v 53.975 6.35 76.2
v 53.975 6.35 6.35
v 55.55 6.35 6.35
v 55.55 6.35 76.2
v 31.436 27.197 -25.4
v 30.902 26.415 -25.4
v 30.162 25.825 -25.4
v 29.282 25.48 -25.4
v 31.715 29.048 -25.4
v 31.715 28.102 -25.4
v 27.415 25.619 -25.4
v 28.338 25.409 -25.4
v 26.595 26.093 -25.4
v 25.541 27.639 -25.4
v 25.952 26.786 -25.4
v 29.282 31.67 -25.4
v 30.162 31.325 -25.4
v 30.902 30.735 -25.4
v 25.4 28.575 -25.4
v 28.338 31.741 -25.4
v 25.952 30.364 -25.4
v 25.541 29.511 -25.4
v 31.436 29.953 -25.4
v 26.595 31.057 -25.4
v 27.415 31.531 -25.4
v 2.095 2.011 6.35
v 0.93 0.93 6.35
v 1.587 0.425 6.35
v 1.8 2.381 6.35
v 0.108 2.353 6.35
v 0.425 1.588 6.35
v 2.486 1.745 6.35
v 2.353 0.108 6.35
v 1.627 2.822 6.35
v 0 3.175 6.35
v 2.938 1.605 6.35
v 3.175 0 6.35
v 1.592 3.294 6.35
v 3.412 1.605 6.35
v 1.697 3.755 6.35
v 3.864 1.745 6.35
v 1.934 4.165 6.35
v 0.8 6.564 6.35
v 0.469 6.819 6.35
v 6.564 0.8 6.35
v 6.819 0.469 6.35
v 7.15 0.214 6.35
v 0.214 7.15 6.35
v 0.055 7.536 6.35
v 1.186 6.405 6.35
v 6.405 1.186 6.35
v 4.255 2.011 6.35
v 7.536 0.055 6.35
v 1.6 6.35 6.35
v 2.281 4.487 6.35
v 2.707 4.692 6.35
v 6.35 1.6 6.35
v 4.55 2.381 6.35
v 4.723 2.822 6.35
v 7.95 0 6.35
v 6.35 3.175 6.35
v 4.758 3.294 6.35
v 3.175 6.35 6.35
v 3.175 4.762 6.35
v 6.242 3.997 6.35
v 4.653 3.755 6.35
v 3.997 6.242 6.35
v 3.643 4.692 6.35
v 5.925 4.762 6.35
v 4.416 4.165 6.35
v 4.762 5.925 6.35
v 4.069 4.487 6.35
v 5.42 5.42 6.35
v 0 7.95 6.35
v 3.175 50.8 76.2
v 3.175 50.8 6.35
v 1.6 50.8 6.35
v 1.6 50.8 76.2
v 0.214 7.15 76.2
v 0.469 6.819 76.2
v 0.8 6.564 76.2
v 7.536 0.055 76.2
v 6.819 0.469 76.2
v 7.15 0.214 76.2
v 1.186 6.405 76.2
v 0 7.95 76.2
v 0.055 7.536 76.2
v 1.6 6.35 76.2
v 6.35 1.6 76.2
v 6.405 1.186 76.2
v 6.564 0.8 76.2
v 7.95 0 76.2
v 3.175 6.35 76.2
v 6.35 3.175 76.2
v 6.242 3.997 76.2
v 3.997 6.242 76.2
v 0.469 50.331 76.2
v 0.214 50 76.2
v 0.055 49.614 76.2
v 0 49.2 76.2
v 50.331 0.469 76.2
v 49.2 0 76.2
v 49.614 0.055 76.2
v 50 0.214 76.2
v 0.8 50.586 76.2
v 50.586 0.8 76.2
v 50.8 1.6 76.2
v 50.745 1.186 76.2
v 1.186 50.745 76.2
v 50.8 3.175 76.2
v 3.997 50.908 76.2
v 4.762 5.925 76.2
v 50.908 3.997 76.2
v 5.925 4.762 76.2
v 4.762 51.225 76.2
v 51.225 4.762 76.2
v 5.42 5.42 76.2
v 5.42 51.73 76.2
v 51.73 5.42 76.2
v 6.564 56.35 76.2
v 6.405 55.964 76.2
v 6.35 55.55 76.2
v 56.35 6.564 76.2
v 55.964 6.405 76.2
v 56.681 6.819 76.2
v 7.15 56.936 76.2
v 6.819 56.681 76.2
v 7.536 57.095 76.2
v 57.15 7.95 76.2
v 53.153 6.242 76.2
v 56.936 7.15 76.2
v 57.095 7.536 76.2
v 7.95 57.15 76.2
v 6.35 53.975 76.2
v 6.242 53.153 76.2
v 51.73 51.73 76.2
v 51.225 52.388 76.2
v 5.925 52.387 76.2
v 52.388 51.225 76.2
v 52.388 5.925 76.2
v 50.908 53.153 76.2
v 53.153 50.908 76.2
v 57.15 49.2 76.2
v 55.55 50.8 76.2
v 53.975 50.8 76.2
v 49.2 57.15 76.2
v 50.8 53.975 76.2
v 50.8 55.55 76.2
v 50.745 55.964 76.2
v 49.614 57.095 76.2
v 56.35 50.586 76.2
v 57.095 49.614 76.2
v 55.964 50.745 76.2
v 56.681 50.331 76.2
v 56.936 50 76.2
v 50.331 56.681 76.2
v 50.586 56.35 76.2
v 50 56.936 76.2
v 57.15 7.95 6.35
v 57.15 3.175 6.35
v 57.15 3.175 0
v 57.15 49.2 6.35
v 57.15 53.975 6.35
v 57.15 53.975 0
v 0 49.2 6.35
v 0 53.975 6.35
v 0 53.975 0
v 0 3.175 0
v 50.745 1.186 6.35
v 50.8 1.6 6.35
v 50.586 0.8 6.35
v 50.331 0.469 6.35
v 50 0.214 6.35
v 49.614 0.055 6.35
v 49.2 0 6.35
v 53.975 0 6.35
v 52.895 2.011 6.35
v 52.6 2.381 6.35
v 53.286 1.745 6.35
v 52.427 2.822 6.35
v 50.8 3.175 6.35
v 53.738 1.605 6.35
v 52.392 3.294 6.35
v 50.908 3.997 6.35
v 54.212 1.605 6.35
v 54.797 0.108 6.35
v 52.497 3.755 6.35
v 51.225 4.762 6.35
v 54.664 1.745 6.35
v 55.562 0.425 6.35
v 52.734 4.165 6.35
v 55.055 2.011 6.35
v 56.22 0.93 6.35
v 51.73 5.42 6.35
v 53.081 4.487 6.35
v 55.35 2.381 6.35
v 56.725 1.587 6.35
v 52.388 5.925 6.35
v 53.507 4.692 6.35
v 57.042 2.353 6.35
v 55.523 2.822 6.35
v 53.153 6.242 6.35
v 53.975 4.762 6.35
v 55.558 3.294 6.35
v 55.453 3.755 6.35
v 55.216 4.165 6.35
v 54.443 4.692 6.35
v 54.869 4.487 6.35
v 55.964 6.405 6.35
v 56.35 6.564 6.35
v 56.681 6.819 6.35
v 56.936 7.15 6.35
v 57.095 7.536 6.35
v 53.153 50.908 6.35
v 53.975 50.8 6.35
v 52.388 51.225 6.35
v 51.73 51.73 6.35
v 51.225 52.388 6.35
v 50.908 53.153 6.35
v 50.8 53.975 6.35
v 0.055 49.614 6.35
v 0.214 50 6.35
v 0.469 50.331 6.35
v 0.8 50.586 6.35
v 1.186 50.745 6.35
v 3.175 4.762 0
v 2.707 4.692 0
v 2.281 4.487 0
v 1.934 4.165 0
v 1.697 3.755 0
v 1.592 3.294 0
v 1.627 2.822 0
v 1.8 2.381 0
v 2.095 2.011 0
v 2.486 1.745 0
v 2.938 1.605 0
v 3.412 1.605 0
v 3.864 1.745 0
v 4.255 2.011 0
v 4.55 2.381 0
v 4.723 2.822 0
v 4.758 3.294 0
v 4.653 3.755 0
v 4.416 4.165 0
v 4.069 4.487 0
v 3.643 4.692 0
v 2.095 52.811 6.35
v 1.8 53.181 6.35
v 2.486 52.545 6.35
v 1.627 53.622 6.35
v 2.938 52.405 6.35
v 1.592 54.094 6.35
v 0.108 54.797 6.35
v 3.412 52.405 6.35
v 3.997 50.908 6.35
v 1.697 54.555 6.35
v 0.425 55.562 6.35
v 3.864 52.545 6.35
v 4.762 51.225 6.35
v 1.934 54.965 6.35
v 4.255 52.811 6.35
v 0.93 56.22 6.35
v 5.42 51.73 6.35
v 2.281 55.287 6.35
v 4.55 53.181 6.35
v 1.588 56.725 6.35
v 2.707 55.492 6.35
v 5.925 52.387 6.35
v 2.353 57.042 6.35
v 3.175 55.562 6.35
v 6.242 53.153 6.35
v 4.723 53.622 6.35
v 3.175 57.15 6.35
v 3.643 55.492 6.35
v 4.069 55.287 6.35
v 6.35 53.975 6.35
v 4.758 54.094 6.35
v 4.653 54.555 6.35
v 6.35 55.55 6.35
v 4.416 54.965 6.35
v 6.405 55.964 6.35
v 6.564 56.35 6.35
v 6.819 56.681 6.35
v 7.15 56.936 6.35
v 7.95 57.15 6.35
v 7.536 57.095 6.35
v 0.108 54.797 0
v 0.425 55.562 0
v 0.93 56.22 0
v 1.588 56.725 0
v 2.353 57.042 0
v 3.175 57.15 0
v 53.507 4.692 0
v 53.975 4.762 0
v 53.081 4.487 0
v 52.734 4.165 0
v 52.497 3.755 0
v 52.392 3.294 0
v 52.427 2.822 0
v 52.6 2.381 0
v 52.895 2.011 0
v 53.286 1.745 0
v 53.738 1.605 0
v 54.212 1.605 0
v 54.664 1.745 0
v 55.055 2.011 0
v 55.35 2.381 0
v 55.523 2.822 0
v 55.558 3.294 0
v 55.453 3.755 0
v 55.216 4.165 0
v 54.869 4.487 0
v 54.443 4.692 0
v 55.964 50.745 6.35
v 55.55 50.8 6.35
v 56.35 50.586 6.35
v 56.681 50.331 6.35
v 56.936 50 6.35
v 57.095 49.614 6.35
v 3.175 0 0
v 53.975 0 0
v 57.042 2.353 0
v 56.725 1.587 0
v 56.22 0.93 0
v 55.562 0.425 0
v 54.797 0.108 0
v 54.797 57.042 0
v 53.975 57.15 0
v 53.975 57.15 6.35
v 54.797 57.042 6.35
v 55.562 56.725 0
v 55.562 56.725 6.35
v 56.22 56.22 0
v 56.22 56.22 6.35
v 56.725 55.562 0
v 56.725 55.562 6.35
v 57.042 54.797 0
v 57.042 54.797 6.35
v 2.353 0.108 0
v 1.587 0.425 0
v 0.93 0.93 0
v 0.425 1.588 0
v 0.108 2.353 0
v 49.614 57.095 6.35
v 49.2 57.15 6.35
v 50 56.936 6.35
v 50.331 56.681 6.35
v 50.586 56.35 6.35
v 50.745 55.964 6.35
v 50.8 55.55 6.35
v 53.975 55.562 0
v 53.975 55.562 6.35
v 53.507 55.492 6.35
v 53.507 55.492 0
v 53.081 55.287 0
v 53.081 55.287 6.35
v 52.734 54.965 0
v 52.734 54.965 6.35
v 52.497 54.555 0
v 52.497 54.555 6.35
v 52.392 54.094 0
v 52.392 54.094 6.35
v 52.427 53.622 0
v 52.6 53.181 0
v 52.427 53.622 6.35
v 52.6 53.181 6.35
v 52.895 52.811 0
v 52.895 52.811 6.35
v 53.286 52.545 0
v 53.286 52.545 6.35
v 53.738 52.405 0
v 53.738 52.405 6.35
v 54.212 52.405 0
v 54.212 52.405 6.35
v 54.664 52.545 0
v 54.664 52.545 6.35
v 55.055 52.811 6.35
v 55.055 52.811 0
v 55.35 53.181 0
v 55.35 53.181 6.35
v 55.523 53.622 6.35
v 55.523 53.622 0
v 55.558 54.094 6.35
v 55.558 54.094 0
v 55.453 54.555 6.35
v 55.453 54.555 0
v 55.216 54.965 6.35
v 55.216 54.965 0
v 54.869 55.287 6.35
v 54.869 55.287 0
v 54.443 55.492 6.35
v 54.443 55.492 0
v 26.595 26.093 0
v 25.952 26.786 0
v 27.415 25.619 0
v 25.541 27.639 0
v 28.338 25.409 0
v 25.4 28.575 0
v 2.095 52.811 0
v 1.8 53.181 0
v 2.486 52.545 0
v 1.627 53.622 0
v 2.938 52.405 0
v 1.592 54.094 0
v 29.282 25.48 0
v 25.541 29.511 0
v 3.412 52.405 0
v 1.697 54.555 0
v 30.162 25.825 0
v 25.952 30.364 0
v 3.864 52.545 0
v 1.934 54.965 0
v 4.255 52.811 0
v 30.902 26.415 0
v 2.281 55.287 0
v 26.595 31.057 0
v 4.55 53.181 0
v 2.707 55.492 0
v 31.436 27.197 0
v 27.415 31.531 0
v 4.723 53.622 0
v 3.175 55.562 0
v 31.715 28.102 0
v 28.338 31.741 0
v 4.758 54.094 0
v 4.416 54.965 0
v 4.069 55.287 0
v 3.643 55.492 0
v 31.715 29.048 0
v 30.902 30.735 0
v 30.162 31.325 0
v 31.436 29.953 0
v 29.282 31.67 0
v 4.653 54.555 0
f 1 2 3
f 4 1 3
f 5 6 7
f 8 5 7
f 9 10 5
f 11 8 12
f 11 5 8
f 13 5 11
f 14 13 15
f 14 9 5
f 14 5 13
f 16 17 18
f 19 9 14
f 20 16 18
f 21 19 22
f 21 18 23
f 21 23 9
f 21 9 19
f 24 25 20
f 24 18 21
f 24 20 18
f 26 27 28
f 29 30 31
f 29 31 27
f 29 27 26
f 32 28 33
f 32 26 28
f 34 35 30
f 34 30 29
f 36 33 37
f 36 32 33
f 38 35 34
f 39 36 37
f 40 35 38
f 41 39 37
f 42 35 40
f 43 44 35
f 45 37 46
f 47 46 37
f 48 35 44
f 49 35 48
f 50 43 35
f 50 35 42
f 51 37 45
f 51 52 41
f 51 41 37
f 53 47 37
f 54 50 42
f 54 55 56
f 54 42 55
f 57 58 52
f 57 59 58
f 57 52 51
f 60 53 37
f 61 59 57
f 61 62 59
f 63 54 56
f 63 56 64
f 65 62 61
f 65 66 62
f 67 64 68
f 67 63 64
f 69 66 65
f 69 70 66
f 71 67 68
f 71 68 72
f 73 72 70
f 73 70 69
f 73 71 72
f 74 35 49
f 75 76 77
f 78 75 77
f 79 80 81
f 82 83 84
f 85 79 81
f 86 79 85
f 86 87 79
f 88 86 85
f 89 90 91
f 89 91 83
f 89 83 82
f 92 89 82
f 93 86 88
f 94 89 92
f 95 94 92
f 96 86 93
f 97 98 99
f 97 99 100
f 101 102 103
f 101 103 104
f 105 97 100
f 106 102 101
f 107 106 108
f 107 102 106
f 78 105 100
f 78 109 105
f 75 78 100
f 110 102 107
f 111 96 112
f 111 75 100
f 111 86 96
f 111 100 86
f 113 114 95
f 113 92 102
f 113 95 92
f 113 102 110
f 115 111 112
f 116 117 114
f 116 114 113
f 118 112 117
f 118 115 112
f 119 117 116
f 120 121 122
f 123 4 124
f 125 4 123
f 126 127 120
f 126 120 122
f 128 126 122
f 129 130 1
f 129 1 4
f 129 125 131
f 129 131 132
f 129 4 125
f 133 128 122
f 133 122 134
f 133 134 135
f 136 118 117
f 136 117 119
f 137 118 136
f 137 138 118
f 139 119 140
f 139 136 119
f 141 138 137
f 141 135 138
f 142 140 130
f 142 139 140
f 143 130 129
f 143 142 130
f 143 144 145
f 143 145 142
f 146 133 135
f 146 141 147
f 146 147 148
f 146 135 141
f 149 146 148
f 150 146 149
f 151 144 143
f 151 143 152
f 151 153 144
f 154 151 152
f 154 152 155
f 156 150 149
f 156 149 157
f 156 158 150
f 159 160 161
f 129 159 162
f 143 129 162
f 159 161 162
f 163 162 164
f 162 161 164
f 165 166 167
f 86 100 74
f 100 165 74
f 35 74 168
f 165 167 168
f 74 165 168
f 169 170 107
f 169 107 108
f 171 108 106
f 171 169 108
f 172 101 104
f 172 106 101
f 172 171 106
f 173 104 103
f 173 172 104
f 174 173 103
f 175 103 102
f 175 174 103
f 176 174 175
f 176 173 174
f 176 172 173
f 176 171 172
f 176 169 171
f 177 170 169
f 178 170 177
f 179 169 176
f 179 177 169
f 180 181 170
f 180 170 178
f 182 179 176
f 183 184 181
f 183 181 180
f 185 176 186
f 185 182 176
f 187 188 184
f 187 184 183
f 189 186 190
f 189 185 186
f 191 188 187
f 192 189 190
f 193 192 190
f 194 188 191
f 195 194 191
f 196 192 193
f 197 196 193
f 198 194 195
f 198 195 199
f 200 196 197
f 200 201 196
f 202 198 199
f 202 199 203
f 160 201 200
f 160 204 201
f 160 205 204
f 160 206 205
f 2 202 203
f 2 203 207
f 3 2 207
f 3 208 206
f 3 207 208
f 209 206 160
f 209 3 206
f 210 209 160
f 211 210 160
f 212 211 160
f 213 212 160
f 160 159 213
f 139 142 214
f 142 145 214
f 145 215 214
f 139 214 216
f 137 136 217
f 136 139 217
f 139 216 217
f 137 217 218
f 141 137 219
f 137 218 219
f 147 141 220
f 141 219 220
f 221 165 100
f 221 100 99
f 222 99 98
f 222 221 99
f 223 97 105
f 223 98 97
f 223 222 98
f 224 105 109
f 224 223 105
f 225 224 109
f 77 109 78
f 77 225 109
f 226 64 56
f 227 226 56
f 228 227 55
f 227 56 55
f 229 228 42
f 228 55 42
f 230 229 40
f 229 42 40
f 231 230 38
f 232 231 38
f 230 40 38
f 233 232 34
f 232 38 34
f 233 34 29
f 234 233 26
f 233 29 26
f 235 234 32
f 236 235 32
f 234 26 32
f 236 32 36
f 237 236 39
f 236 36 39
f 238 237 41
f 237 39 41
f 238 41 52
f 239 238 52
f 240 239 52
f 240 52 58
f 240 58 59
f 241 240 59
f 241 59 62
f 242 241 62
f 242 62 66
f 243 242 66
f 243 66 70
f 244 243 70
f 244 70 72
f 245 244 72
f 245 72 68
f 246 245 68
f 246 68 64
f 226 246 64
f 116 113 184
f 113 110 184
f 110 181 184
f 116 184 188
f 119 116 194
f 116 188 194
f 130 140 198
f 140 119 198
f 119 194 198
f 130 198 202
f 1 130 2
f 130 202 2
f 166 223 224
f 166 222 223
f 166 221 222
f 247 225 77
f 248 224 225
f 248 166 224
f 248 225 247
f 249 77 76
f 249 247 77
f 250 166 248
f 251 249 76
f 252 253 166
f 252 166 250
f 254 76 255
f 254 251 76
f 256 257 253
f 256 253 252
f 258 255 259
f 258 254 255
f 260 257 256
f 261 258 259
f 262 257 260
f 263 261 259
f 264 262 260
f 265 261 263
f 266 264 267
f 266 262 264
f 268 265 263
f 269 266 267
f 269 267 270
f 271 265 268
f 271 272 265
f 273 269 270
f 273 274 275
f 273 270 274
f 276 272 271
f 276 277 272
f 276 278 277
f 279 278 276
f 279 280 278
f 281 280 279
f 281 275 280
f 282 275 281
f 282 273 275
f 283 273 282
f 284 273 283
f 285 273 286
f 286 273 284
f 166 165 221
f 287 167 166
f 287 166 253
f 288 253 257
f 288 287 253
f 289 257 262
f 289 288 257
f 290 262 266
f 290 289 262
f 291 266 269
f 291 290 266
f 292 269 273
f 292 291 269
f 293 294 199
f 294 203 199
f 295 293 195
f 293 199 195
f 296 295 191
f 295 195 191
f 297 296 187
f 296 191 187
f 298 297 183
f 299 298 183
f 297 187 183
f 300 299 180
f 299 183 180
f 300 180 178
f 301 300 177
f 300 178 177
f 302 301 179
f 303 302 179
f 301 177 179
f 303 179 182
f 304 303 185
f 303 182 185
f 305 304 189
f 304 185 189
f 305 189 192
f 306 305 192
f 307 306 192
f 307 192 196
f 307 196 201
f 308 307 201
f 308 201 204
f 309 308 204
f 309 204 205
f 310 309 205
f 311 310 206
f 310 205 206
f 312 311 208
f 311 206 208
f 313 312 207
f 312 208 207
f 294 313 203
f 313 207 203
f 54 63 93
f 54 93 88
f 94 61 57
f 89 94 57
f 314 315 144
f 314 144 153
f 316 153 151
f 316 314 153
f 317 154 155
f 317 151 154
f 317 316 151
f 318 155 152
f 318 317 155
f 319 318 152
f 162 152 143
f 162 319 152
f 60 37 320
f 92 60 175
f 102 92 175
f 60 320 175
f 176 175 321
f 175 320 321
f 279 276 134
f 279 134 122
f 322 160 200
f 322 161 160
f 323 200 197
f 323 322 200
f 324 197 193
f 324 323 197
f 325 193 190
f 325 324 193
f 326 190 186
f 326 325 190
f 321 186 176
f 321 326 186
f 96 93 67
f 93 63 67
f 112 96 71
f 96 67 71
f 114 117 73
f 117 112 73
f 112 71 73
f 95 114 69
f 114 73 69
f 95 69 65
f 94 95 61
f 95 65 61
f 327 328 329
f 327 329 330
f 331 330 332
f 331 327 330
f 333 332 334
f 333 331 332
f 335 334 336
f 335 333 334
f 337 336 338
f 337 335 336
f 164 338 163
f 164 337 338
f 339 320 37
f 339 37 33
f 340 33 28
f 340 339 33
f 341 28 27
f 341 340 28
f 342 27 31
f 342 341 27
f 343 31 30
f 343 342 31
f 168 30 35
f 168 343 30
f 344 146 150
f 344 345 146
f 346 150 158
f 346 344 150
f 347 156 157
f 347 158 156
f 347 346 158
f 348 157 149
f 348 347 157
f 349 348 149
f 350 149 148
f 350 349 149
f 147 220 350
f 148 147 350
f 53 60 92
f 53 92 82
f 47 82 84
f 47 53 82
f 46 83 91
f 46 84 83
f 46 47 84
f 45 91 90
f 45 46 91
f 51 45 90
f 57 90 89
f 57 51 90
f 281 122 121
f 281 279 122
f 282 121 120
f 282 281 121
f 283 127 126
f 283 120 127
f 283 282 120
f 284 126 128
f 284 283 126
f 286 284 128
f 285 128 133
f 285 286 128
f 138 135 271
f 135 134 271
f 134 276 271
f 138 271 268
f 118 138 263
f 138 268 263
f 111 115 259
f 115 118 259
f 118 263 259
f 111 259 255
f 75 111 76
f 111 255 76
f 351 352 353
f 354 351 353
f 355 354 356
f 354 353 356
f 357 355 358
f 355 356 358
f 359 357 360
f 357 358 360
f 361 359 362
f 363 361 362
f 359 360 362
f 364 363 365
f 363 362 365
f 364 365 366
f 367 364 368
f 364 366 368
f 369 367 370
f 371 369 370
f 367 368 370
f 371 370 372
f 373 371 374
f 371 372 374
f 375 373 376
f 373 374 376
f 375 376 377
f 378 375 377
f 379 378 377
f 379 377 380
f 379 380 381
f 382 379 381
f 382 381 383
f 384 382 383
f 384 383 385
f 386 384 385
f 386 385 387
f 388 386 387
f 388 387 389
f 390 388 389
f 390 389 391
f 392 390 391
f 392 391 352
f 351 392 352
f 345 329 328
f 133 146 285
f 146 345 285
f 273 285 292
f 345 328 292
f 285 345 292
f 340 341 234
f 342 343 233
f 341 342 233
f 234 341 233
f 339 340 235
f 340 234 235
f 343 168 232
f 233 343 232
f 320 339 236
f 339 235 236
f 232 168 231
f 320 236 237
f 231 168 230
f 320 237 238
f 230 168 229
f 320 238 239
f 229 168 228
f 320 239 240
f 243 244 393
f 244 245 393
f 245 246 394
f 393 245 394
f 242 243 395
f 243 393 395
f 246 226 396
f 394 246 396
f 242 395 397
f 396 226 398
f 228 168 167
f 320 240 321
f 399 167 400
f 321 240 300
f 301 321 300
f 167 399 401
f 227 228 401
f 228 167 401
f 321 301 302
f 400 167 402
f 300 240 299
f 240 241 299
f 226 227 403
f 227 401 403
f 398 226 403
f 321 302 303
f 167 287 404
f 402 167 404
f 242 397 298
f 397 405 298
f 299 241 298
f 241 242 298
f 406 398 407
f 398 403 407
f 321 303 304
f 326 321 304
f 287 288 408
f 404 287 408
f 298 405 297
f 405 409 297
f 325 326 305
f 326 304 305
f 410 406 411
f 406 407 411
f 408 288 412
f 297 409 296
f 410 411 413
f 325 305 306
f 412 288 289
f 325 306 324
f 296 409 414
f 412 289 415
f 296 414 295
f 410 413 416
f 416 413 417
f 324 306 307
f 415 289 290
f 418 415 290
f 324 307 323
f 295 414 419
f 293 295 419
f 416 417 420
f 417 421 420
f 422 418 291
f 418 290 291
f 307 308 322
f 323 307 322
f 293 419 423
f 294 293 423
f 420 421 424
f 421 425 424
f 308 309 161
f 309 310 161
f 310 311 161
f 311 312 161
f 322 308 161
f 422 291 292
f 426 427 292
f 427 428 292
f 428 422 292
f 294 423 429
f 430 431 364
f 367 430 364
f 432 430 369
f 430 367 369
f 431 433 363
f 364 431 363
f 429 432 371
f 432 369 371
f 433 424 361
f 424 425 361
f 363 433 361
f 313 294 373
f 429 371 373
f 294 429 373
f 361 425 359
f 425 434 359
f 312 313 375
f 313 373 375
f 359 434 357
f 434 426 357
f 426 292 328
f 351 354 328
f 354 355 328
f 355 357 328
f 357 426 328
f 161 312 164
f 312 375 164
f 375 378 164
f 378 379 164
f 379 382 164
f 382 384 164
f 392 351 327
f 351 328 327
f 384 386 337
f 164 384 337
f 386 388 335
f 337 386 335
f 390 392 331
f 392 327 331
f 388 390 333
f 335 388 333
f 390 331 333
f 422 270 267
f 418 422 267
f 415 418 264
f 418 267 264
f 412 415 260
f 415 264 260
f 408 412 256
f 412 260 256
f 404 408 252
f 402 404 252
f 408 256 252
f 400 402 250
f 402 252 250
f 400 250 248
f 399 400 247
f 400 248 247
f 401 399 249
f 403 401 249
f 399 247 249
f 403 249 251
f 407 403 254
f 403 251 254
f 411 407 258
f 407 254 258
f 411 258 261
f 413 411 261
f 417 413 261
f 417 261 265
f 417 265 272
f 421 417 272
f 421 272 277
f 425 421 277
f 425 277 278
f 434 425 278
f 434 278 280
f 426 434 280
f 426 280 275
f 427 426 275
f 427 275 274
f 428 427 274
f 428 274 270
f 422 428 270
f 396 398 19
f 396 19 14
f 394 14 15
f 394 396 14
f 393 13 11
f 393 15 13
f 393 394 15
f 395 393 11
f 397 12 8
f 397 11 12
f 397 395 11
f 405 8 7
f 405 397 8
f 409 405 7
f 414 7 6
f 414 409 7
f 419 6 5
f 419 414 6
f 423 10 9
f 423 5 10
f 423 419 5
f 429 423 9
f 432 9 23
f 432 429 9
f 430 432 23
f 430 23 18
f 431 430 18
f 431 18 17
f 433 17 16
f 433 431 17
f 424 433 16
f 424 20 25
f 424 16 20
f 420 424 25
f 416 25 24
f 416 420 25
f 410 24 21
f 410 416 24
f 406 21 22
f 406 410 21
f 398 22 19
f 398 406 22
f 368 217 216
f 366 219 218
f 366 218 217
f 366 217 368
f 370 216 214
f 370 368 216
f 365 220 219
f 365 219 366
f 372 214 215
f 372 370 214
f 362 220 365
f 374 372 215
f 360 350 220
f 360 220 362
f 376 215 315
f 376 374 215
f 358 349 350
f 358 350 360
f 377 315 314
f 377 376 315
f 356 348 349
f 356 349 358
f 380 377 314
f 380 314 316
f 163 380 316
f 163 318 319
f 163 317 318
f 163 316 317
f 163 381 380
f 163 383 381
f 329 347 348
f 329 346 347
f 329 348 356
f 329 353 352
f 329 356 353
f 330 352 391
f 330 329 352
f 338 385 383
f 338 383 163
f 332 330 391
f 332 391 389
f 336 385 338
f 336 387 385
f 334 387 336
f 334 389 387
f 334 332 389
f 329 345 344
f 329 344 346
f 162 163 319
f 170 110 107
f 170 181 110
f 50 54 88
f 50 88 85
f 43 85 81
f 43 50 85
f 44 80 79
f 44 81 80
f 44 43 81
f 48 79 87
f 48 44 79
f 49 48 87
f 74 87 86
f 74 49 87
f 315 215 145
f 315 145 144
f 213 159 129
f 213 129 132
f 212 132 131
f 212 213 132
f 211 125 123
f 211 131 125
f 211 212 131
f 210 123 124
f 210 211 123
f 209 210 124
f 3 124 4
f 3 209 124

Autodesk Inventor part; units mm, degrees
ref_plane "YZ Plane" through (0, 0, 0) normal (1, 0, 0) x (0, 1, 0)
ref_plane "XZ Plane" through (0, 0, 0) normal (0, 1, 0) x (-1, 0, 0)
ref_plane "XY Plane" through (0, 0, 0) normal (0, 0, 1) x (1, 0, 0)
sketch "Sketch1" plane through (0, 0, 0) normal (0, 0, 1) x (1, 0, 0)
  line L0 (3.175, 0) -> (53.975, 0)
  line L1 (57.15, 3.175) -> (57.15, 53.975)
  line L2 (53.975, 57.15) -> (3.175, 57.15)
  line L3 (0, 53.975) -> (0, 3.175)
  arc A0 (3.175, 57.15) -> (0, 53.975) centre (3.175, 53.975) ccw
  arc A1 (57.15, 53.975) -> (53.975, 57.15) centre (53.975, 53.975) ccw
  arc A2 (53.975, 0) -> (57.15, 3.175) centre (53.975, 3.175) ccw
  arc A3 (0, 3.175) -> (3.175, 0) centre (3.175, 3.175) ccw
  point P0 (0, 0)
  point P1 (57.15, 57.15)
  point P2 (57.15, 0)
  point P3 (0, 57.15)
  dimension "d0" = 57.15
  dimension "d1" = 57.15
  dimension "d2" = 3.175
extrude "Extrusion1" add sketch "Sketch1" along normal blind 6.35
sketch "Sketch2" plane through (0, 0, 6.35) normal (0, 0, 1) x (1, 0, 0)
  arc A0 (57.15, 53.975) -> (53.975, 57.15) centre (53.975, 53.975) ccw projected
  line L0 (3.175, 57.15) -> (53.975, 57.15) projected
  arc A1 (3.175, 57.15) -> (0, 53.975) centre (3.175, 53.975) ccw projected
  line L1 (0, 3.175) -> (0, 53.975) projected
  arc A2 (0, 3.175) -> (3.175, 0) centre (3.175, 3.175) ccw projected
  line L2 (53.975, 0) -> (3.175, 0) projected
  arc A3 (53.975, 0) -> (57.15, 3.175) centre (53.975, 3.175) ccw projected
  line L3 (57.15, 53.975) -> (57.15, 3.175) projected
  circle A4 centre (3.175, 53.975) radius 3.175
  circle A5 centre (53.975, 53.975) radius 3.175
  circle A6 centre (53.975, 3.175) radius 3.175
  circle A7 centre (3.175, 3.175) radius 3.175
  line L4 (6.35, 53.975) -> (6.35, 55.5498)
  line L5 (3.175, 50.8) -> (1.6002, 50.8)
  line L6 (50.8, 53.975) -> (50.8, 55.5498)
  line L7 (53.975, 50.8) -> (55.5498, 50.8)
  line L8 (53.975, 6.35) -> (55.5498, 6.35)
  line L9 (50.8, 3.175) -> (50.8, 1.6002)
  line L10 (6.35, 3.175) -> (6.35, 1.6002)
  line L11 (3.175, 6.35) -> (1.6002, 6.35)
  line L12 (7.9502, 57.15) -> (49.1998, 57.15)
  line L13 (57.15, 49.1998) -> (57.15, 7.9502)
  line L14 (49.1998, 0) -> (7.9502, 0)
  line L15 (0, 7.9502) -> (0, 49.1998)
  arc A8 (1.6002, 50.8) -> (0, 49.1998) centre (1.6002, 49.1998) ccw
  arc A9 (7.9502, 57.15) -> (6.35, 55.5498) centre (7.9502, 55.5498) ccw
  arc A10 (50.8, 55.5498) -> (49.1998, 57.15) centre (49.1998, 55.5498) ccw
  arc A11 (57.15, 49.1998) -> (55.5498, 50.8) centre (55.5498, 49.1998) ccw
  arc A12 (55.5498, 6.35) -> (57.15, 7.9502) centre (55.5498, 7.9502) ccw
  arc A13 (49.1998, 0) -> (50.8, 1.6002) centre (49.1998, 1.6002) ccw
  arc A14 (6.35, 1.6002) -> (7.9502, 0) centre (7.9502, 1.6002) ccw
  arc A15 (0, 7.9502) -> (1.6002, 6.35) centre (1.6002, 7.9502) ccw
  point P0 (0, 0)
  point P1 (6.35, 57.15)
  point P2 (0, 50.8)
  point P3 (50.8, 57.15)
  point P4 (57.15, 50.8)
  point P5 (57.15, 6.35)
  point P6 (50.8, 0)
  point P7 (6.35, 0)
  point P8 (0, 6.35)
  dimension "d5" = 1.6002
extrude "Extrusion2" add sketch "Sketch2" along normal blind 69.85 contours L3 A12 L8 A6 L9 A13 L2 A14 L10 A7 L11 A15 L1 A8 L5 A4 L4 A9 L0 A10 L6 A5 L7 A11
sketch "Sketch3" plane through (0, 0, 0) normal (0, 0, -1) x (-1, 0, 0)
  arc A0 (-53.975, 57.15) -> (-57.15, 53.975) centre (-53.975, 53.975) ccw projected
  arc A1 (-57.15, 3.175) -> (-53.975, 0) centre (-53.975, 3.175) ccw projected
  arc A2 (-3.175, 0) -> (0, 3.175) centre (-3.175, 3.175) ccw projected
  arc A3 (0, 53.975) -> (-3.175, 57.15) centre (-3.175, 53.975) ccw projected
  circle A4 centre (-53.975, 53.975) radius 1.5875
  circle A5 centre (-3.175, 3.175) radius 1.5875
  circle A6 centre (-53.975, 3.175) radius 1.5875
  point P0 (0, 0)
  dimension "d8" = 3.175
  dimension "d10" = 3.175
  dimension "d11" = 3.175
hole "Hole1" at (53.975, 53.975, 0) at (3.175, 53.975, 0) at (3.175, 3.175, 0) at (53.975, 3.175, 0) direction (0, 0, 1) diameter 3.175 depth 25.4 tip angle 118
sketch "Sketch4" plane through (0, 0, 0) normal (0, 0, -1) x (-1, 0, 0)
  circle A0 centre (-28.575, 28.575) radius 3.175
  point P0 (0, 0)
  dimension "d19" = 6.35
extrude "Extrusion3" add sketch "Sketch4" along normal blind 25.4
properties part number "nema 23 frame size servo"
